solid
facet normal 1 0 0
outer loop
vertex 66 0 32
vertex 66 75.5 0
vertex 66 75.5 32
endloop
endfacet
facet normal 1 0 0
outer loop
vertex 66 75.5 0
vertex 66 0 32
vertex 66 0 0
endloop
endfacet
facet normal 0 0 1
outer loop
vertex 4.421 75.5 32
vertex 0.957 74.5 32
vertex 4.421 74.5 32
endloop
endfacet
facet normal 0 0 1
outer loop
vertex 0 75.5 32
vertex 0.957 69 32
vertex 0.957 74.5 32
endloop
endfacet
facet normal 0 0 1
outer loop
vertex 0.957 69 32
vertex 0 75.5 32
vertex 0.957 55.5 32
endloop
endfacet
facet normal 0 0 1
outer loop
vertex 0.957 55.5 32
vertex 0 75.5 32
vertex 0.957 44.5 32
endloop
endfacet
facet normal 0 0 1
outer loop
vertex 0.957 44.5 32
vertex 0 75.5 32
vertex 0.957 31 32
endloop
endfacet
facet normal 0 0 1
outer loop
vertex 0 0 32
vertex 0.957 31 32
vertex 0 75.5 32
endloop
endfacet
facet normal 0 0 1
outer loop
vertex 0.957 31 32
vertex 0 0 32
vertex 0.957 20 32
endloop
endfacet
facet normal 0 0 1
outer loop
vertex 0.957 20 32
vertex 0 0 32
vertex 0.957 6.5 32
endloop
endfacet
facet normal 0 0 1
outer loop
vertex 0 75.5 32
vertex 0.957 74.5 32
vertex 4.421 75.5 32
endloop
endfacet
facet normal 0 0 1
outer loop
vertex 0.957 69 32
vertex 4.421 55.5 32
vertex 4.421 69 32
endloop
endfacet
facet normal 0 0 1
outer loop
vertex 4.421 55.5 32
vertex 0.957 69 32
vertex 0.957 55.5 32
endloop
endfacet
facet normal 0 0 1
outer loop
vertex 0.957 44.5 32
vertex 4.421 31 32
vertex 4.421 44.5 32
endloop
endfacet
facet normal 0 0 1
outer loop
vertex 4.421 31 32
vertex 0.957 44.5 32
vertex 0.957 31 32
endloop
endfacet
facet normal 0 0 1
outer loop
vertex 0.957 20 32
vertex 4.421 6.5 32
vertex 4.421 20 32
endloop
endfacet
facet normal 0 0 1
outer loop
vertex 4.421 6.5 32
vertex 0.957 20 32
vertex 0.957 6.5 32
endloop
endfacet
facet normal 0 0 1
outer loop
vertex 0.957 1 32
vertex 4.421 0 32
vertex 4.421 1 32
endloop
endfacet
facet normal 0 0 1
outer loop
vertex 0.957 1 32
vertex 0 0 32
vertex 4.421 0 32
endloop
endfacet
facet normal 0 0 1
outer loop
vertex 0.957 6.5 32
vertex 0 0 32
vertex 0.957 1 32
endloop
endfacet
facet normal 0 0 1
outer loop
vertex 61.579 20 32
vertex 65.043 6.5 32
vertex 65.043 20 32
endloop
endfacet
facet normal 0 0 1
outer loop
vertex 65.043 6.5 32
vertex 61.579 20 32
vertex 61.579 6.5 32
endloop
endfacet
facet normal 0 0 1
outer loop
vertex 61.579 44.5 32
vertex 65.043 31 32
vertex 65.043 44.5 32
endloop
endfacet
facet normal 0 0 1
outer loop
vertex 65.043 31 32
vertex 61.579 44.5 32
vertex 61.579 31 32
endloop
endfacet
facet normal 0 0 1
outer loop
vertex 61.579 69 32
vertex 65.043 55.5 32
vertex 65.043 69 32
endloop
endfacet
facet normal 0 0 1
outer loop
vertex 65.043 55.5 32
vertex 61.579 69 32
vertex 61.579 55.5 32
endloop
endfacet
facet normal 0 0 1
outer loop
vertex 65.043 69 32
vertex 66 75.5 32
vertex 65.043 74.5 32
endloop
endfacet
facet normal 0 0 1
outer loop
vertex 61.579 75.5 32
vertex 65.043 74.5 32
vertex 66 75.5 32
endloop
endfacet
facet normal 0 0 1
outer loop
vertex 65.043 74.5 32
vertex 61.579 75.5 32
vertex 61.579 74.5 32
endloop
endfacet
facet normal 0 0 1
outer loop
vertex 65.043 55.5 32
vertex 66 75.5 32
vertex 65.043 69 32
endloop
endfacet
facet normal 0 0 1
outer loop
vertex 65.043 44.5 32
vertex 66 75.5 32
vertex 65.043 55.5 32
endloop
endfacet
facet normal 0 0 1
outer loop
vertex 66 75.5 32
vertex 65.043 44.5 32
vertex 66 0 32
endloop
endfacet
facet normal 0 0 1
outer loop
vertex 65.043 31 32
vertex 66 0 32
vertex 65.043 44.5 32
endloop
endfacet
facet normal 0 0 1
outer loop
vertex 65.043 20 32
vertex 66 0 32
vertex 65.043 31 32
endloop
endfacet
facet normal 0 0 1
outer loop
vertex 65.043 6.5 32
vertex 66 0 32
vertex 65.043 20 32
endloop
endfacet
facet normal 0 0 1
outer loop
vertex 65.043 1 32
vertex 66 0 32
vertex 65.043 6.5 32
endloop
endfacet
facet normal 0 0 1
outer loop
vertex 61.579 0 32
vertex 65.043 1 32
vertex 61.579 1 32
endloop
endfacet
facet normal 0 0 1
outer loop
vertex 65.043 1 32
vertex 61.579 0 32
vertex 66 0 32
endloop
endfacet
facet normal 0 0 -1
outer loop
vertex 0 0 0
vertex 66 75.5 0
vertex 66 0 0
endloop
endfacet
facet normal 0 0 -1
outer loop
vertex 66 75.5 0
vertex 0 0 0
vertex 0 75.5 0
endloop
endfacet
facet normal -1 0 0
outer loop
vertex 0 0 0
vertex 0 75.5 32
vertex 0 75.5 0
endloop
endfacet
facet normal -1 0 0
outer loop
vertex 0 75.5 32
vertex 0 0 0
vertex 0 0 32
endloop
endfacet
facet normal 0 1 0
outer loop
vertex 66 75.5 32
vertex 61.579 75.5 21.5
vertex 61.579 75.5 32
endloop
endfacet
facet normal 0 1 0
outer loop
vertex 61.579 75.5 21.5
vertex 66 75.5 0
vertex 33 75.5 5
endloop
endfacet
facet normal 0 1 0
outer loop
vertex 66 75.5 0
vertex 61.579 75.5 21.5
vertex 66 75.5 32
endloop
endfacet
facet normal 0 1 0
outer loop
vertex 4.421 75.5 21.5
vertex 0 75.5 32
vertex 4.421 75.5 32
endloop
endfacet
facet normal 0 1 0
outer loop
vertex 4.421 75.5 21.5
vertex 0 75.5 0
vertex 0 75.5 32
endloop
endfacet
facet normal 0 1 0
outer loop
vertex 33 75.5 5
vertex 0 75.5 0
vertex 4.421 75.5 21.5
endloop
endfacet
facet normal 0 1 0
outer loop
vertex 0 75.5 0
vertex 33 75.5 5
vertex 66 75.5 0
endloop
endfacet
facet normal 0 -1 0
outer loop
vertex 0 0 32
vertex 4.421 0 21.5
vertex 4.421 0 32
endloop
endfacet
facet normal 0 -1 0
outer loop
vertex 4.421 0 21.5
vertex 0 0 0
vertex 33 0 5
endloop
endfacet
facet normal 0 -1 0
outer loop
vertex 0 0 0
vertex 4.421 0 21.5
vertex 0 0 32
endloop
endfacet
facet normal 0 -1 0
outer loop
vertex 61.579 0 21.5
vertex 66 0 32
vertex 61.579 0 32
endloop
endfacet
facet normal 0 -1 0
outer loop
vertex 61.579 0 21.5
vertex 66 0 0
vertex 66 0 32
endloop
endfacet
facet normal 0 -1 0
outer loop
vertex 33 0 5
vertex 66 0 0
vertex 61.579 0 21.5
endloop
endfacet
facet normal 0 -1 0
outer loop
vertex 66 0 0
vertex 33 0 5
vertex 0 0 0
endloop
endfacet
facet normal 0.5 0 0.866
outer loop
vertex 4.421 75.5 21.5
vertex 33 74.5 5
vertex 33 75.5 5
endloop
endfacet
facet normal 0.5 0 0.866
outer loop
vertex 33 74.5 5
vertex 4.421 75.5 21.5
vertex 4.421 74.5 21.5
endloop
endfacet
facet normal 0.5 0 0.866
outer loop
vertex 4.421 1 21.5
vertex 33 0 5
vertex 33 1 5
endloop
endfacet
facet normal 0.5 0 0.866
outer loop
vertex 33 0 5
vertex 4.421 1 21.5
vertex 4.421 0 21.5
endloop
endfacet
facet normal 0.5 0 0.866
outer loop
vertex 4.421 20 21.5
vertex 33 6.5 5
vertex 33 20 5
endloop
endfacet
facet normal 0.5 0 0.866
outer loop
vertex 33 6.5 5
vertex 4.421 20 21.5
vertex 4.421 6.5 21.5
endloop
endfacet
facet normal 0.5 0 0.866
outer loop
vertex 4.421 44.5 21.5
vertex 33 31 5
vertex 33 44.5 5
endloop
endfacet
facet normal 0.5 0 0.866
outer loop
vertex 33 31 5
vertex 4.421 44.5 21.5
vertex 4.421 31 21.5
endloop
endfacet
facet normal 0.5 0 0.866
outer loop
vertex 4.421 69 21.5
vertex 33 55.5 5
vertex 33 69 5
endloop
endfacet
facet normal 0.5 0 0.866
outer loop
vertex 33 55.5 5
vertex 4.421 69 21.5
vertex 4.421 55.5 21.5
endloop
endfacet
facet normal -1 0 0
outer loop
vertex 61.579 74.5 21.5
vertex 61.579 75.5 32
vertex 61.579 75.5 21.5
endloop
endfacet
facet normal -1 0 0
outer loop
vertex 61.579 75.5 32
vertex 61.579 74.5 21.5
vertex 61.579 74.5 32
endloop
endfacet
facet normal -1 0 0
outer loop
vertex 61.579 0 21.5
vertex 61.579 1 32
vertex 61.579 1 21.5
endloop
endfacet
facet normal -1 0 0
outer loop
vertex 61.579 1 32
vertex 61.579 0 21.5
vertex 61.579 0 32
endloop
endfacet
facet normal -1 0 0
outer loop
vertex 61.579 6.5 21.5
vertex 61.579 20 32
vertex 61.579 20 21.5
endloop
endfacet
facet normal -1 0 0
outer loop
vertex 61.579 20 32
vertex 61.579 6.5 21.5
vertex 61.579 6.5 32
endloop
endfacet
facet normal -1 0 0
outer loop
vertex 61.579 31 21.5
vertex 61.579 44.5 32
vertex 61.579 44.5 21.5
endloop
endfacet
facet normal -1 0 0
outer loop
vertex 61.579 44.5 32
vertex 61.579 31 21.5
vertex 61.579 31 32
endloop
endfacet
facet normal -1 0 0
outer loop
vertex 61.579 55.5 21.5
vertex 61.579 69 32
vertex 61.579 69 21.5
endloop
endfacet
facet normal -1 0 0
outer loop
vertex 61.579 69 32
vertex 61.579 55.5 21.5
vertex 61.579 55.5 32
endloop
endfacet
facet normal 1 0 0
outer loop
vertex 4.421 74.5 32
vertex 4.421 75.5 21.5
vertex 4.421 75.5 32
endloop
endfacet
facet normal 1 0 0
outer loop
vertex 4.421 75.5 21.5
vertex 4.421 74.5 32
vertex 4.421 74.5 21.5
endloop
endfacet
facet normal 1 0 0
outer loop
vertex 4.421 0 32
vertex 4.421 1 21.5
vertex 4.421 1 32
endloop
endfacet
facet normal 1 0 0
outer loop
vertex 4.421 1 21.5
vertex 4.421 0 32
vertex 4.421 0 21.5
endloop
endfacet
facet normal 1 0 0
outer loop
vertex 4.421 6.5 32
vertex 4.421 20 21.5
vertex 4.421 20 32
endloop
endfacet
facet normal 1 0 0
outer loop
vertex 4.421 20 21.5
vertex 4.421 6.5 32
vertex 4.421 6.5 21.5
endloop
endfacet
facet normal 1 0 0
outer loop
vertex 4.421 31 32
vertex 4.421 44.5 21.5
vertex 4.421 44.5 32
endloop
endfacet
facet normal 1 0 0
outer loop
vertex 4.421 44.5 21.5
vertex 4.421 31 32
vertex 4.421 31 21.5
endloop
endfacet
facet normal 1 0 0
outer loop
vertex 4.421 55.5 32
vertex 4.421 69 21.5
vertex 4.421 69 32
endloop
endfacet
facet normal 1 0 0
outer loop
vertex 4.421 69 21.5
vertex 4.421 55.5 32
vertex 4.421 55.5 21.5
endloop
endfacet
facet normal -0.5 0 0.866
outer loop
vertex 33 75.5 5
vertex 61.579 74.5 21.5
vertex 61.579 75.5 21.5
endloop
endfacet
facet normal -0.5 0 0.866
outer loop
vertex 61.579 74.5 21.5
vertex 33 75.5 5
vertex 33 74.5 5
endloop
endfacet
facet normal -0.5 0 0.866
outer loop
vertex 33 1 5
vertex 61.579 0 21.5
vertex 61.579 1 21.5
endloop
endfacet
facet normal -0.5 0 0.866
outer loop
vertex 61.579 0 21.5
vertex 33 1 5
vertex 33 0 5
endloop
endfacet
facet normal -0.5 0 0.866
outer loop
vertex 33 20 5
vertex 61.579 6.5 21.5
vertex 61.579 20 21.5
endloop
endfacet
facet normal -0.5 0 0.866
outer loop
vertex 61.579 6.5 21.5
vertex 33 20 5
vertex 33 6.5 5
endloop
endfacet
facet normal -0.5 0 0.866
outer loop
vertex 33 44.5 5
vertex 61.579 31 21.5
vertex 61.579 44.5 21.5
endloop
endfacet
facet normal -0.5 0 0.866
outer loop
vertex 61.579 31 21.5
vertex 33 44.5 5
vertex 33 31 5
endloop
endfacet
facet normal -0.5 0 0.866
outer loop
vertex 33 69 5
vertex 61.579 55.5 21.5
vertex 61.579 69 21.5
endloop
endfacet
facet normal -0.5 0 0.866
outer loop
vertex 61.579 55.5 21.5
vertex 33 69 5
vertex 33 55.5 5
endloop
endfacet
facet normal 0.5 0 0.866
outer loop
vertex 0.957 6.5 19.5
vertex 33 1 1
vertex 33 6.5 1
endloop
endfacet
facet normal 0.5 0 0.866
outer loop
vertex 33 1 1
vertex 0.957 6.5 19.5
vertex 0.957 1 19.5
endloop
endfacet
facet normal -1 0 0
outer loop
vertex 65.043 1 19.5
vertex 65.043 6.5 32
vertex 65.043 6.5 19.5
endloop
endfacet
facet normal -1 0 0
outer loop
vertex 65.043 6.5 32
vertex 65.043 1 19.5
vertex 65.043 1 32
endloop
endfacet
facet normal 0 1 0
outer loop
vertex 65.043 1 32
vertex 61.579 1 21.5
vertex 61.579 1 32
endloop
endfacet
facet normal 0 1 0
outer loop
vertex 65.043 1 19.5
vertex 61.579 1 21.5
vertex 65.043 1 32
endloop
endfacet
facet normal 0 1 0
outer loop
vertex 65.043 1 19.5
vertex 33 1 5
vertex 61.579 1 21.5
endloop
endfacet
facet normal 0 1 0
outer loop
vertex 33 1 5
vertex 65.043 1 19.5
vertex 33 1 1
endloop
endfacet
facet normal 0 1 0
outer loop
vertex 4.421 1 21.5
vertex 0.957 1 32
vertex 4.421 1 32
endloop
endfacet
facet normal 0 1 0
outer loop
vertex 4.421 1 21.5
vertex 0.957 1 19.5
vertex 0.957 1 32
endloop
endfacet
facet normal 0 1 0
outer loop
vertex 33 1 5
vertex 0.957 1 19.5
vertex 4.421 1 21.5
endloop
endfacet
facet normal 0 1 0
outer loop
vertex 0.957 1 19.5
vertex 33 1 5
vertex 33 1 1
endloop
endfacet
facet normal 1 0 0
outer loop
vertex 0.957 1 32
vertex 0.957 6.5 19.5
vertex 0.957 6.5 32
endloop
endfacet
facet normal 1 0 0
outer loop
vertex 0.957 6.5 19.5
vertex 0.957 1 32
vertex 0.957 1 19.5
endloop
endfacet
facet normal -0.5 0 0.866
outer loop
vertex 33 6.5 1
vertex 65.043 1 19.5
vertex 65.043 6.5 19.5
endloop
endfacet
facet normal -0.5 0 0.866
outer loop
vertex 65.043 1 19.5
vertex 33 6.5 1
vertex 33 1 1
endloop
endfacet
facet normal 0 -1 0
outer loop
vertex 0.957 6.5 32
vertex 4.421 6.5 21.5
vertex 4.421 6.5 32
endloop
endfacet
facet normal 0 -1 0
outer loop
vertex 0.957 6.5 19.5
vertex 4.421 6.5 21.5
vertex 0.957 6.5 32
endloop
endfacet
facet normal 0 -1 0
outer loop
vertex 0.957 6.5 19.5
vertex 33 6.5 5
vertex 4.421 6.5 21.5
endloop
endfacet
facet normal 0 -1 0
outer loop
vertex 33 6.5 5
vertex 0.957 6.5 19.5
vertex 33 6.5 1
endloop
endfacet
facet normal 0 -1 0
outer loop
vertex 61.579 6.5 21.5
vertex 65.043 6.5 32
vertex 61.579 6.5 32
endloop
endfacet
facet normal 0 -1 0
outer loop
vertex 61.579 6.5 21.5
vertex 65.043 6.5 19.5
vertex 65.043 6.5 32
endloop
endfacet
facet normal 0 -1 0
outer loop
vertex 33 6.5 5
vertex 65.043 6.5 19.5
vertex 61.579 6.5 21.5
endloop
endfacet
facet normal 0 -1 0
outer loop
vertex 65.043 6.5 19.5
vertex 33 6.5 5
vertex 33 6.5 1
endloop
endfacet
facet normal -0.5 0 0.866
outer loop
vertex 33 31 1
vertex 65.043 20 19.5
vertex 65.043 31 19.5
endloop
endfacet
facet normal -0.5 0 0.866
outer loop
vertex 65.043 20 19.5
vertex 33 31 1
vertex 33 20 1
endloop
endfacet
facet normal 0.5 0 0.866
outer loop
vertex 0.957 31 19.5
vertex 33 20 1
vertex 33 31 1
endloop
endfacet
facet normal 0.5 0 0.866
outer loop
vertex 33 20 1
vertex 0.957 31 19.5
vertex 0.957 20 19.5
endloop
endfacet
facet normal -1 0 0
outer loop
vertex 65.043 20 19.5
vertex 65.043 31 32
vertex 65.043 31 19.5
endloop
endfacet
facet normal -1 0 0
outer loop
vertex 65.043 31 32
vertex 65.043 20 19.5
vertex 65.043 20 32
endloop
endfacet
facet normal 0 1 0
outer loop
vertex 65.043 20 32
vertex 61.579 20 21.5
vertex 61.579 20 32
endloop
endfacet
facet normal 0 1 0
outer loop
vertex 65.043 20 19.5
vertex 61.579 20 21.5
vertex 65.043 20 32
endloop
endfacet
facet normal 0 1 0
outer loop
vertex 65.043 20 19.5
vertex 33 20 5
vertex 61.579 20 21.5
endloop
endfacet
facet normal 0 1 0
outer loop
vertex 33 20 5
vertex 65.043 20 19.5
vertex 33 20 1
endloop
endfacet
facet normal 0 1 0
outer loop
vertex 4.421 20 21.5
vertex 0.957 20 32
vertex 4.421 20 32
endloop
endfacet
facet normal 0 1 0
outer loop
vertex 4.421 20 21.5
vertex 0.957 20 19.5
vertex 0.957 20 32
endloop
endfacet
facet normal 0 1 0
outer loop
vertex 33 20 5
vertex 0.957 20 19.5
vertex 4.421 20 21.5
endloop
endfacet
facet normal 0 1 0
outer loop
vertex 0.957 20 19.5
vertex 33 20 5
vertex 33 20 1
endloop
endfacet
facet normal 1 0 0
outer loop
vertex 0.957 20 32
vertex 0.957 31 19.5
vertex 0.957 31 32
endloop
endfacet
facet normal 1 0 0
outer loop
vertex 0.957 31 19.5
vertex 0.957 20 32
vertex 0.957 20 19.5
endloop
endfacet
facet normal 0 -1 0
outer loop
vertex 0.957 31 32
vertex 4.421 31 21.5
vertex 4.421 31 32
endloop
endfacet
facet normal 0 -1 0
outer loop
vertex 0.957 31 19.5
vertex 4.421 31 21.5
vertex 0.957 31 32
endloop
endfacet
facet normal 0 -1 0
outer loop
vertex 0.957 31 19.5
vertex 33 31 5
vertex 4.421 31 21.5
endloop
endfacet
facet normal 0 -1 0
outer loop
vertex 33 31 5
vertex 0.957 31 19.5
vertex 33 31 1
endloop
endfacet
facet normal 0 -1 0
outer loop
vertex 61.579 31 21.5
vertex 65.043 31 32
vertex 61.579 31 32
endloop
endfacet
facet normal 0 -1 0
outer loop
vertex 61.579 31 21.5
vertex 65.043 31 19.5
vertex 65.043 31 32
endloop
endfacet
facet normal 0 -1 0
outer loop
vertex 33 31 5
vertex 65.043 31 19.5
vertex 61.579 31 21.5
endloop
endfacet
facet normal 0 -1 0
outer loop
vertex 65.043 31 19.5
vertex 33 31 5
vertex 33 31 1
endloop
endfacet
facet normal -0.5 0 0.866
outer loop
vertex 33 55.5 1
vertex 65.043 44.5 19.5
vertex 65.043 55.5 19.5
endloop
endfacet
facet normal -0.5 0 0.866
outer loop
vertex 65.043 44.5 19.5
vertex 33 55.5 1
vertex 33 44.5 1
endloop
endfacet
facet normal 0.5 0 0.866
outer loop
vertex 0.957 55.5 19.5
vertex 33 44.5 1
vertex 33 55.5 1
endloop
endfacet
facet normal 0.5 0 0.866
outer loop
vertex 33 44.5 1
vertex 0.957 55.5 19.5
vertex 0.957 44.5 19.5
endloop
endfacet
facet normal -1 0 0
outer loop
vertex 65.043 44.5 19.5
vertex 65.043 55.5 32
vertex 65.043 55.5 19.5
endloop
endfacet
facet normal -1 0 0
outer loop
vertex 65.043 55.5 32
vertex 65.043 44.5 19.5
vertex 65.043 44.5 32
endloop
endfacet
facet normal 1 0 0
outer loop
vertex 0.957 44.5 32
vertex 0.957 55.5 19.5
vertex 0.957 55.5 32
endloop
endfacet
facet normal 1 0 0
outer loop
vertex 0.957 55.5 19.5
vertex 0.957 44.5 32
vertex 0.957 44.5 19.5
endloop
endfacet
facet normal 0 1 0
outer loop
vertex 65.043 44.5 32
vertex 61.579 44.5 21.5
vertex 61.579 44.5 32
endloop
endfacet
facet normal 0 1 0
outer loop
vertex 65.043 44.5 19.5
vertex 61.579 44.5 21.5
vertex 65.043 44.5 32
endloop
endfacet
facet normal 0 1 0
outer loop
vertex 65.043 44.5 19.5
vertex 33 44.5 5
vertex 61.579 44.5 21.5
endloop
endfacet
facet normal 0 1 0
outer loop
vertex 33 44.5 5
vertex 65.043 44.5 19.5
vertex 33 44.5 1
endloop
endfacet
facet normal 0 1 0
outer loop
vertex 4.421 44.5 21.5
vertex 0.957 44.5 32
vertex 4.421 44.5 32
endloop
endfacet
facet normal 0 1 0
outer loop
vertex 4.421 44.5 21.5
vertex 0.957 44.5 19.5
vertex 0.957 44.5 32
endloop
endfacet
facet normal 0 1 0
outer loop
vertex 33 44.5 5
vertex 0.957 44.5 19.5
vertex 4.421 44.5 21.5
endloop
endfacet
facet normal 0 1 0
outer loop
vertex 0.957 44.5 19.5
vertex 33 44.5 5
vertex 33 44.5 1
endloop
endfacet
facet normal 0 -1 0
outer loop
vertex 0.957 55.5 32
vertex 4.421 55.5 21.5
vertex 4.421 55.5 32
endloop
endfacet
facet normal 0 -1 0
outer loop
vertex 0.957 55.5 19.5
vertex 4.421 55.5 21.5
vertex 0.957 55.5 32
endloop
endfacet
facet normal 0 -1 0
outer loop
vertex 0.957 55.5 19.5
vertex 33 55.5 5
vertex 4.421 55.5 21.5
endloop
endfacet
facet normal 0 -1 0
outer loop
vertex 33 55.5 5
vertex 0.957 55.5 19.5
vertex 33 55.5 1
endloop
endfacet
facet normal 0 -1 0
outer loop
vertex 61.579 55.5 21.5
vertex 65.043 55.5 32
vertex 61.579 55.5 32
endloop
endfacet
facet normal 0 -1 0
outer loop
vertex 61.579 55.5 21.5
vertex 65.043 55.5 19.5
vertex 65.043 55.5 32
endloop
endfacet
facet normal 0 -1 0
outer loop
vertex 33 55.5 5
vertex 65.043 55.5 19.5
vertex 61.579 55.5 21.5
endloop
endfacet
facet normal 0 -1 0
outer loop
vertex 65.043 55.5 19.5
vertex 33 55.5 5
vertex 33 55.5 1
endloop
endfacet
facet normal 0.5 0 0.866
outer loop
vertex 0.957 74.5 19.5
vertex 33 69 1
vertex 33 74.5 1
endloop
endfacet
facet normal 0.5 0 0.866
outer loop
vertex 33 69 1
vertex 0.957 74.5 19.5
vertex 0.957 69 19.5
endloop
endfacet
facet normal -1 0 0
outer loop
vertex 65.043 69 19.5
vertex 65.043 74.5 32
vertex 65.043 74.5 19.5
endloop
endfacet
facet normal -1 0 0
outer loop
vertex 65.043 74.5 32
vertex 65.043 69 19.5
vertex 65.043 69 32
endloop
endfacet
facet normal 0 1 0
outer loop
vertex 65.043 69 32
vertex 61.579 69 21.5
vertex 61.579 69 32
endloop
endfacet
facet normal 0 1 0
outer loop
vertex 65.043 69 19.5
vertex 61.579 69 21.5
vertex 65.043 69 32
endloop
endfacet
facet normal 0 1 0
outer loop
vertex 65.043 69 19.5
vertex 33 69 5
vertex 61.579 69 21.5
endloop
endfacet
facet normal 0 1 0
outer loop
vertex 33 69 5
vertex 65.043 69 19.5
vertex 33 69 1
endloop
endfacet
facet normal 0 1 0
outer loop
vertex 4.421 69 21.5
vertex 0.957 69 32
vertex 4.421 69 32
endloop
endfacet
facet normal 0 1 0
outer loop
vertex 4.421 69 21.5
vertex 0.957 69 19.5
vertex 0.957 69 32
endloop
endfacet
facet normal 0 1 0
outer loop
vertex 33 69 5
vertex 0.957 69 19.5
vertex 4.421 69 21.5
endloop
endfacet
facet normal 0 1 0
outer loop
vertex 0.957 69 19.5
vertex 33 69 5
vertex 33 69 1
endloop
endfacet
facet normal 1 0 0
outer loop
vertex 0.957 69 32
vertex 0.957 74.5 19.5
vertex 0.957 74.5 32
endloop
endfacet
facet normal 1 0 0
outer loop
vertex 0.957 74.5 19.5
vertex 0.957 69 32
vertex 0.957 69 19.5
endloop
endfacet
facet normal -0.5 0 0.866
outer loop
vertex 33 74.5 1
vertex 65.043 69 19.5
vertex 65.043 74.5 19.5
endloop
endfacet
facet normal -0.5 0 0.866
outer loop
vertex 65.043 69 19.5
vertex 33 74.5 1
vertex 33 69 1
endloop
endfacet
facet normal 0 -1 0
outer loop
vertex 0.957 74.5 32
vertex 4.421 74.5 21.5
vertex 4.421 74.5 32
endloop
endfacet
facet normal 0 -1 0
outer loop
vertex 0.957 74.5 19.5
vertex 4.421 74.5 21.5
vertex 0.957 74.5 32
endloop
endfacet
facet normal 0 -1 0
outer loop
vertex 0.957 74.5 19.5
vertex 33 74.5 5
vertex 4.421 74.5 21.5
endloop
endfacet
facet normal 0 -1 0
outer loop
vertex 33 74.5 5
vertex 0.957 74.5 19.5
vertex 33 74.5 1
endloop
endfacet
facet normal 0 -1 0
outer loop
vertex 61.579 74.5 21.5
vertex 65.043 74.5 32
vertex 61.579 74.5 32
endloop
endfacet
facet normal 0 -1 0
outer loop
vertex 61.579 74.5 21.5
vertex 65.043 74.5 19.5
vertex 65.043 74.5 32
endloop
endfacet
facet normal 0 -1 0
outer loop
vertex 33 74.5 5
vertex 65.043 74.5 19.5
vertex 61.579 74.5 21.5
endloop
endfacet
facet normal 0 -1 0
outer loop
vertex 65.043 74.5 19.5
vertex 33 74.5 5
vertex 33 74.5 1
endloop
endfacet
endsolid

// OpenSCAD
$fn=200;
THICK = 1;

TILE_L = 19;
TILE_COUNT = 6;

BOX_W = 64;
BOX_L = 73.5;//122.5; //74
BOX_H = 32;

difference() {
    cube(size = [
        BOX_W + (THICK * 2),
        BOX_L + (THICK * 2), 
        BOX_H]);

    translate([33, -5, 38])
        rotate([0, 90, 90]) 
            cylinder(h = 200, r = 33, $fn=6);

    tile_slot(1);
    tile_slot(1 + TILE_L);

    tile_slot(6.5 + TILE_L);
    tile_slot(6.5 + (TILE_L * 2));

    tile_slot(12 + (TILE_L * 2));
    tile_slot(12 + (TILE_L * 3));

    // tile_slot(17.5 + (TILE_L * 3));
    // tile_slot(17.5 + (TILE_L * 4));

    // tile_slot(23 + (TILE_L * 4));
    // tile_slot(23 + (TILE_L * 5));
}

module tile_slot(y) {
    translate([33, y, 38])
        rotate([0, 90, 90]) 
            cylinder(h = 5.5, r = 37, $fn=6);
}
